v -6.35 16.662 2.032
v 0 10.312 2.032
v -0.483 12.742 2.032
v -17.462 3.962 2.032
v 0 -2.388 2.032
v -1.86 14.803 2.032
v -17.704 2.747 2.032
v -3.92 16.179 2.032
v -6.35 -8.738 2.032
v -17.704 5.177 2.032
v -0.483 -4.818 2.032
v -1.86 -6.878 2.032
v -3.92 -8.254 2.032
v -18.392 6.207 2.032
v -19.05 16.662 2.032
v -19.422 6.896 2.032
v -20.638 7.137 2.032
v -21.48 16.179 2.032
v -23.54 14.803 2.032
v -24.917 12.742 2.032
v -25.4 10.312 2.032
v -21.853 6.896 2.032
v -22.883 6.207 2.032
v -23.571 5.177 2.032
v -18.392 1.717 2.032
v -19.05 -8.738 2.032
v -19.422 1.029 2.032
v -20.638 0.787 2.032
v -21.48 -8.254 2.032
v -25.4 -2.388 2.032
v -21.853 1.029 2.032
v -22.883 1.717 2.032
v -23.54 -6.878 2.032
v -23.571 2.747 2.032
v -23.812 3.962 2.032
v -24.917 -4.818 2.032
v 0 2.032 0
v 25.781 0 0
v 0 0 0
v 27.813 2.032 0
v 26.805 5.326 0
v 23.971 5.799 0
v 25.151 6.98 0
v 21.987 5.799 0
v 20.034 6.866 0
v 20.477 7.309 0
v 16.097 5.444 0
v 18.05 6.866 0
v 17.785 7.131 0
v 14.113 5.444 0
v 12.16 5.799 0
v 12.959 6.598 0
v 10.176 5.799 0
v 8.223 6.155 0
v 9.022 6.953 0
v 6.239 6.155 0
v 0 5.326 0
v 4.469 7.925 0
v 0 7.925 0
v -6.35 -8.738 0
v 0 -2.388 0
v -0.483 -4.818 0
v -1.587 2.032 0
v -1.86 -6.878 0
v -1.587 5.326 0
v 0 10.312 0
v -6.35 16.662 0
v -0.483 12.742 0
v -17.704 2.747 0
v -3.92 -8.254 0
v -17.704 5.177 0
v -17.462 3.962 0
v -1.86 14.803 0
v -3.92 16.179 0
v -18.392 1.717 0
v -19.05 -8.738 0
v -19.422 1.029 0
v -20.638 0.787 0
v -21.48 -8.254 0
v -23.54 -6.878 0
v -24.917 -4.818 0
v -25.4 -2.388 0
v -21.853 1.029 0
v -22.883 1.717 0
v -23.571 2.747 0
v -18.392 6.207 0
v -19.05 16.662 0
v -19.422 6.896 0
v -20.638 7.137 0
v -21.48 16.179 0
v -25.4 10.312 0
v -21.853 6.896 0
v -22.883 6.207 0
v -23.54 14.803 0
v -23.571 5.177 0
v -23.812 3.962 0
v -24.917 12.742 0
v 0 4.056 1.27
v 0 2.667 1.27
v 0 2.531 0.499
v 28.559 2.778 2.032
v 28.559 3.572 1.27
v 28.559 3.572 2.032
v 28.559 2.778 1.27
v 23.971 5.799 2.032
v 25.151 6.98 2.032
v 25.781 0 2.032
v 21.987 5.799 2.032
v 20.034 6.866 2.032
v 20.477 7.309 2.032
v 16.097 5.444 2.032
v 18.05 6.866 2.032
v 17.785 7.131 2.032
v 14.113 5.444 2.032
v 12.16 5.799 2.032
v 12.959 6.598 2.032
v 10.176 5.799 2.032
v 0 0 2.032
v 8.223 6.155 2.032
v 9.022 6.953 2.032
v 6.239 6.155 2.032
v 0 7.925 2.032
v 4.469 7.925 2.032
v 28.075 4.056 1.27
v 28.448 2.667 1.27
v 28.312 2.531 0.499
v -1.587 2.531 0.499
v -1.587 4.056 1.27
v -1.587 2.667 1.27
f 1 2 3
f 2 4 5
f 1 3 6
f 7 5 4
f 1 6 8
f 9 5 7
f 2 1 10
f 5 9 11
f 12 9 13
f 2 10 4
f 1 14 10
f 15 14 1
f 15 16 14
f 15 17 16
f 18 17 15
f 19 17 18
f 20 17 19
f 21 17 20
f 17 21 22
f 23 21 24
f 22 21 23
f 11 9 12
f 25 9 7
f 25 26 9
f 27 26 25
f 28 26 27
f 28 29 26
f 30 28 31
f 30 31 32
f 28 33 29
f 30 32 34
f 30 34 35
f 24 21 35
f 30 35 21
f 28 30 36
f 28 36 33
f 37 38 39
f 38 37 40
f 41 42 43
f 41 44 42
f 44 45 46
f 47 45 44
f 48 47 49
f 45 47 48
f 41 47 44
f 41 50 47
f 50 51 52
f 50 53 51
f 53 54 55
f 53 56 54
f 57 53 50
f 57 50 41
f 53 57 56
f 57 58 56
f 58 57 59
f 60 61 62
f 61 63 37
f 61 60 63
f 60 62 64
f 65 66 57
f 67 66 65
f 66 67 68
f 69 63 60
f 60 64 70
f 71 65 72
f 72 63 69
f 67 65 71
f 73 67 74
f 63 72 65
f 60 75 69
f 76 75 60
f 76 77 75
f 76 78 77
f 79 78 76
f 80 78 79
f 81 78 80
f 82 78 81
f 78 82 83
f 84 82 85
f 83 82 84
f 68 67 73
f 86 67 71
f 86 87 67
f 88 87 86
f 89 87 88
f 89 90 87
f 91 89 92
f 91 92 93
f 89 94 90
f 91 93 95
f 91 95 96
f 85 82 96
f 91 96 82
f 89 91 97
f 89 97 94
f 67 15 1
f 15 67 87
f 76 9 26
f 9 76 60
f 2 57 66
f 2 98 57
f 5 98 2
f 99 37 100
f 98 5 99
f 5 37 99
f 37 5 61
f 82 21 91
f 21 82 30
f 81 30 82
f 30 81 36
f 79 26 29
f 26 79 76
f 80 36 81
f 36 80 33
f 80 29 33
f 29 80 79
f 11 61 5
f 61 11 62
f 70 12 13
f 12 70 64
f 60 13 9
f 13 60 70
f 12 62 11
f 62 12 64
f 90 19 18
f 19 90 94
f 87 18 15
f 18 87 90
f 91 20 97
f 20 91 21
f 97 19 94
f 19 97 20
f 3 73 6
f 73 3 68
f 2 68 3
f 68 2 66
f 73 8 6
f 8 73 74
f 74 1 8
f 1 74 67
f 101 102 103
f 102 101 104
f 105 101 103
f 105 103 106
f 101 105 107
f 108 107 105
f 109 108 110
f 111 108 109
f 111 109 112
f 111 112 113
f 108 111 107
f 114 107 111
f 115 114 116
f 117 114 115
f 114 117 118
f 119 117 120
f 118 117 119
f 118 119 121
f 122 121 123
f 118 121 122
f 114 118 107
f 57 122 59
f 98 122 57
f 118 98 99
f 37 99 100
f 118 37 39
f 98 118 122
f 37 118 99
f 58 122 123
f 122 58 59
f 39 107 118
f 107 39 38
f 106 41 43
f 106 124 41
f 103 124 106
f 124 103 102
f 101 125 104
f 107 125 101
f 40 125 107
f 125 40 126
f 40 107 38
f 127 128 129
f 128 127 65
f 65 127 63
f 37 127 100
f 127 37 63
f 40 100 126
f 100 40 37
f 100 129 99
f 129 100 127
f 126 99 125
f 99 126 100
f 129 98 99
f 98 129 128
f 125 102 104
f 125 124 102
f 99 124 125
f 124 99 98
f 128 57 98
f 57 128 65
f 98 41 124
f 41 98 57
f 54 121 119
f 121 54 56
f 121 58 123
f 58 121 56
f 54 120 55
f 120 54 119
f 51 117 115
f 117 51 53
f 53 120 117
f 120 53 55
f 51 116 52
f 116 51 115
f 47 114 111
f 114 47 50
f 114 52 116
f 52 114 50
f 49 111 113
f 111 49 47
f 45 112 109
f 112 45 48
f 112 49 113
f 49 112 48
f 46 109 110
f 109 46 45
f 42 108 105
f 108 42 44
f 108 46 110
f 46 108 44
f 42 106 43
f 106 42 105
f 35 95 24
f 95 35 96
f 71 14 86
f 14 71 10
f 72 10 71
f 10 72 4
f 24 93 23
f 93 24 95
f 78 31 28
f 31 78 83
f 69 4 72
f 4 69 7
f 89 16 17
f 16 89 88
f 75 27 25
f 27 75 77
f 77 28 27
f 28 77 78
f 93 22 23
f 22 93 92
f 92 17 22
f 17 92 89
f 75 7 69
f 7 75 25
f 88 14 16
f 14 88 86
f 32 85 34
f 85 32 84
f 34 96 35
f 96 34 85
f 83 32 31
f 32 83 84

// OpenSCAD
// Generated by KeyCopier for Arrow AR4
function mm(i) = i*25.4;

module rounded(size, r) { union() { translate([r, 0, 0]) cube([size[0]-2*r, size[1], size[2]]); translate([0, r, 0]) cube([size[0], size[1]-2*r, size[2]]); translate([r, r, 0]) cylinder(h=size[2], r=r, $fn=16); translate([size[0]-r, r, 0]) cylinder(h=size[2], r=r, $fn=16); translate([r, size[1]-r, 0]) cylinder(h=size[2], r=r, $fn=16); translate([size[0]-r, size[1]-r, 0]) cylinder(h=size[2], r=r, $fn=16); } }
module bit() { w = mm(1/4); difference() { translate([-w/2, 0, 0]) cube([w, mm(1), w]); translate([-mm(5/128), 0, 0]) rotate([0, 0, 135]) cube([w, w, w]); translate([mm(5/128), 0, 0]) rotate([0, 0, -45]) cube([w, w, w]); } }
module key(bits) {
    thickness = mm(0.080);
    length = mm(1.140);
    width = mm(0.312);
    shoulder = mm(0.265);
    pin_spacing = mm(0.155);
    depth_inc = mm(0.014);
    fudge = 0.5;
    h_l = mm(1); h_w = mm(1); h_d = mm(1/16);
    difference() {
        union() { translate([-h_l, -h_w/2 + width/2, 0]) rounded([h_l, h_w, thickness], mm(1/4)); cube([length - mm(1/64), width, thickness]); }
        translate([length, mm(1/8), 0]) { rotate([0, 0, 45]) cube([10, 10, thickness]); rotate([0, 0, 225]) cube([10, 10, thickness]); }
        translate([-h_l + mm(3/16), width/2, 0]) cylinder(h=thickness, r=mm(1/8), $fn=16);
        union() { translate([-h_d, mm(.105), mm(.025)]) rotate([225, 0, 0]) cube([length + h_d, width, width]); translate([-h_d, mm(.105), mm(.05)]) rotate([260, 0, 0]) cube([length + h_d, thickness/2, mm(1/32)]); translate([-h_d, mm(.105), 0]) cube([length + h_d, mm(7/128), mm(.05)]); translate([-h_d, mm(.105) + mm(7/128), mm(.05)]) rotate([225, 0, 0]) cube([length + h_d, mm(3/64), thickness]); }
        for (b = [0:5]) {
            translate([shoulder + fudge + b*pin_spacing, width - mm(.008) - (bits[b] - 0)*depth_inc - fudge, 0]) bit();
        }
    }
}

key([3,4,5,1,4,0]);
